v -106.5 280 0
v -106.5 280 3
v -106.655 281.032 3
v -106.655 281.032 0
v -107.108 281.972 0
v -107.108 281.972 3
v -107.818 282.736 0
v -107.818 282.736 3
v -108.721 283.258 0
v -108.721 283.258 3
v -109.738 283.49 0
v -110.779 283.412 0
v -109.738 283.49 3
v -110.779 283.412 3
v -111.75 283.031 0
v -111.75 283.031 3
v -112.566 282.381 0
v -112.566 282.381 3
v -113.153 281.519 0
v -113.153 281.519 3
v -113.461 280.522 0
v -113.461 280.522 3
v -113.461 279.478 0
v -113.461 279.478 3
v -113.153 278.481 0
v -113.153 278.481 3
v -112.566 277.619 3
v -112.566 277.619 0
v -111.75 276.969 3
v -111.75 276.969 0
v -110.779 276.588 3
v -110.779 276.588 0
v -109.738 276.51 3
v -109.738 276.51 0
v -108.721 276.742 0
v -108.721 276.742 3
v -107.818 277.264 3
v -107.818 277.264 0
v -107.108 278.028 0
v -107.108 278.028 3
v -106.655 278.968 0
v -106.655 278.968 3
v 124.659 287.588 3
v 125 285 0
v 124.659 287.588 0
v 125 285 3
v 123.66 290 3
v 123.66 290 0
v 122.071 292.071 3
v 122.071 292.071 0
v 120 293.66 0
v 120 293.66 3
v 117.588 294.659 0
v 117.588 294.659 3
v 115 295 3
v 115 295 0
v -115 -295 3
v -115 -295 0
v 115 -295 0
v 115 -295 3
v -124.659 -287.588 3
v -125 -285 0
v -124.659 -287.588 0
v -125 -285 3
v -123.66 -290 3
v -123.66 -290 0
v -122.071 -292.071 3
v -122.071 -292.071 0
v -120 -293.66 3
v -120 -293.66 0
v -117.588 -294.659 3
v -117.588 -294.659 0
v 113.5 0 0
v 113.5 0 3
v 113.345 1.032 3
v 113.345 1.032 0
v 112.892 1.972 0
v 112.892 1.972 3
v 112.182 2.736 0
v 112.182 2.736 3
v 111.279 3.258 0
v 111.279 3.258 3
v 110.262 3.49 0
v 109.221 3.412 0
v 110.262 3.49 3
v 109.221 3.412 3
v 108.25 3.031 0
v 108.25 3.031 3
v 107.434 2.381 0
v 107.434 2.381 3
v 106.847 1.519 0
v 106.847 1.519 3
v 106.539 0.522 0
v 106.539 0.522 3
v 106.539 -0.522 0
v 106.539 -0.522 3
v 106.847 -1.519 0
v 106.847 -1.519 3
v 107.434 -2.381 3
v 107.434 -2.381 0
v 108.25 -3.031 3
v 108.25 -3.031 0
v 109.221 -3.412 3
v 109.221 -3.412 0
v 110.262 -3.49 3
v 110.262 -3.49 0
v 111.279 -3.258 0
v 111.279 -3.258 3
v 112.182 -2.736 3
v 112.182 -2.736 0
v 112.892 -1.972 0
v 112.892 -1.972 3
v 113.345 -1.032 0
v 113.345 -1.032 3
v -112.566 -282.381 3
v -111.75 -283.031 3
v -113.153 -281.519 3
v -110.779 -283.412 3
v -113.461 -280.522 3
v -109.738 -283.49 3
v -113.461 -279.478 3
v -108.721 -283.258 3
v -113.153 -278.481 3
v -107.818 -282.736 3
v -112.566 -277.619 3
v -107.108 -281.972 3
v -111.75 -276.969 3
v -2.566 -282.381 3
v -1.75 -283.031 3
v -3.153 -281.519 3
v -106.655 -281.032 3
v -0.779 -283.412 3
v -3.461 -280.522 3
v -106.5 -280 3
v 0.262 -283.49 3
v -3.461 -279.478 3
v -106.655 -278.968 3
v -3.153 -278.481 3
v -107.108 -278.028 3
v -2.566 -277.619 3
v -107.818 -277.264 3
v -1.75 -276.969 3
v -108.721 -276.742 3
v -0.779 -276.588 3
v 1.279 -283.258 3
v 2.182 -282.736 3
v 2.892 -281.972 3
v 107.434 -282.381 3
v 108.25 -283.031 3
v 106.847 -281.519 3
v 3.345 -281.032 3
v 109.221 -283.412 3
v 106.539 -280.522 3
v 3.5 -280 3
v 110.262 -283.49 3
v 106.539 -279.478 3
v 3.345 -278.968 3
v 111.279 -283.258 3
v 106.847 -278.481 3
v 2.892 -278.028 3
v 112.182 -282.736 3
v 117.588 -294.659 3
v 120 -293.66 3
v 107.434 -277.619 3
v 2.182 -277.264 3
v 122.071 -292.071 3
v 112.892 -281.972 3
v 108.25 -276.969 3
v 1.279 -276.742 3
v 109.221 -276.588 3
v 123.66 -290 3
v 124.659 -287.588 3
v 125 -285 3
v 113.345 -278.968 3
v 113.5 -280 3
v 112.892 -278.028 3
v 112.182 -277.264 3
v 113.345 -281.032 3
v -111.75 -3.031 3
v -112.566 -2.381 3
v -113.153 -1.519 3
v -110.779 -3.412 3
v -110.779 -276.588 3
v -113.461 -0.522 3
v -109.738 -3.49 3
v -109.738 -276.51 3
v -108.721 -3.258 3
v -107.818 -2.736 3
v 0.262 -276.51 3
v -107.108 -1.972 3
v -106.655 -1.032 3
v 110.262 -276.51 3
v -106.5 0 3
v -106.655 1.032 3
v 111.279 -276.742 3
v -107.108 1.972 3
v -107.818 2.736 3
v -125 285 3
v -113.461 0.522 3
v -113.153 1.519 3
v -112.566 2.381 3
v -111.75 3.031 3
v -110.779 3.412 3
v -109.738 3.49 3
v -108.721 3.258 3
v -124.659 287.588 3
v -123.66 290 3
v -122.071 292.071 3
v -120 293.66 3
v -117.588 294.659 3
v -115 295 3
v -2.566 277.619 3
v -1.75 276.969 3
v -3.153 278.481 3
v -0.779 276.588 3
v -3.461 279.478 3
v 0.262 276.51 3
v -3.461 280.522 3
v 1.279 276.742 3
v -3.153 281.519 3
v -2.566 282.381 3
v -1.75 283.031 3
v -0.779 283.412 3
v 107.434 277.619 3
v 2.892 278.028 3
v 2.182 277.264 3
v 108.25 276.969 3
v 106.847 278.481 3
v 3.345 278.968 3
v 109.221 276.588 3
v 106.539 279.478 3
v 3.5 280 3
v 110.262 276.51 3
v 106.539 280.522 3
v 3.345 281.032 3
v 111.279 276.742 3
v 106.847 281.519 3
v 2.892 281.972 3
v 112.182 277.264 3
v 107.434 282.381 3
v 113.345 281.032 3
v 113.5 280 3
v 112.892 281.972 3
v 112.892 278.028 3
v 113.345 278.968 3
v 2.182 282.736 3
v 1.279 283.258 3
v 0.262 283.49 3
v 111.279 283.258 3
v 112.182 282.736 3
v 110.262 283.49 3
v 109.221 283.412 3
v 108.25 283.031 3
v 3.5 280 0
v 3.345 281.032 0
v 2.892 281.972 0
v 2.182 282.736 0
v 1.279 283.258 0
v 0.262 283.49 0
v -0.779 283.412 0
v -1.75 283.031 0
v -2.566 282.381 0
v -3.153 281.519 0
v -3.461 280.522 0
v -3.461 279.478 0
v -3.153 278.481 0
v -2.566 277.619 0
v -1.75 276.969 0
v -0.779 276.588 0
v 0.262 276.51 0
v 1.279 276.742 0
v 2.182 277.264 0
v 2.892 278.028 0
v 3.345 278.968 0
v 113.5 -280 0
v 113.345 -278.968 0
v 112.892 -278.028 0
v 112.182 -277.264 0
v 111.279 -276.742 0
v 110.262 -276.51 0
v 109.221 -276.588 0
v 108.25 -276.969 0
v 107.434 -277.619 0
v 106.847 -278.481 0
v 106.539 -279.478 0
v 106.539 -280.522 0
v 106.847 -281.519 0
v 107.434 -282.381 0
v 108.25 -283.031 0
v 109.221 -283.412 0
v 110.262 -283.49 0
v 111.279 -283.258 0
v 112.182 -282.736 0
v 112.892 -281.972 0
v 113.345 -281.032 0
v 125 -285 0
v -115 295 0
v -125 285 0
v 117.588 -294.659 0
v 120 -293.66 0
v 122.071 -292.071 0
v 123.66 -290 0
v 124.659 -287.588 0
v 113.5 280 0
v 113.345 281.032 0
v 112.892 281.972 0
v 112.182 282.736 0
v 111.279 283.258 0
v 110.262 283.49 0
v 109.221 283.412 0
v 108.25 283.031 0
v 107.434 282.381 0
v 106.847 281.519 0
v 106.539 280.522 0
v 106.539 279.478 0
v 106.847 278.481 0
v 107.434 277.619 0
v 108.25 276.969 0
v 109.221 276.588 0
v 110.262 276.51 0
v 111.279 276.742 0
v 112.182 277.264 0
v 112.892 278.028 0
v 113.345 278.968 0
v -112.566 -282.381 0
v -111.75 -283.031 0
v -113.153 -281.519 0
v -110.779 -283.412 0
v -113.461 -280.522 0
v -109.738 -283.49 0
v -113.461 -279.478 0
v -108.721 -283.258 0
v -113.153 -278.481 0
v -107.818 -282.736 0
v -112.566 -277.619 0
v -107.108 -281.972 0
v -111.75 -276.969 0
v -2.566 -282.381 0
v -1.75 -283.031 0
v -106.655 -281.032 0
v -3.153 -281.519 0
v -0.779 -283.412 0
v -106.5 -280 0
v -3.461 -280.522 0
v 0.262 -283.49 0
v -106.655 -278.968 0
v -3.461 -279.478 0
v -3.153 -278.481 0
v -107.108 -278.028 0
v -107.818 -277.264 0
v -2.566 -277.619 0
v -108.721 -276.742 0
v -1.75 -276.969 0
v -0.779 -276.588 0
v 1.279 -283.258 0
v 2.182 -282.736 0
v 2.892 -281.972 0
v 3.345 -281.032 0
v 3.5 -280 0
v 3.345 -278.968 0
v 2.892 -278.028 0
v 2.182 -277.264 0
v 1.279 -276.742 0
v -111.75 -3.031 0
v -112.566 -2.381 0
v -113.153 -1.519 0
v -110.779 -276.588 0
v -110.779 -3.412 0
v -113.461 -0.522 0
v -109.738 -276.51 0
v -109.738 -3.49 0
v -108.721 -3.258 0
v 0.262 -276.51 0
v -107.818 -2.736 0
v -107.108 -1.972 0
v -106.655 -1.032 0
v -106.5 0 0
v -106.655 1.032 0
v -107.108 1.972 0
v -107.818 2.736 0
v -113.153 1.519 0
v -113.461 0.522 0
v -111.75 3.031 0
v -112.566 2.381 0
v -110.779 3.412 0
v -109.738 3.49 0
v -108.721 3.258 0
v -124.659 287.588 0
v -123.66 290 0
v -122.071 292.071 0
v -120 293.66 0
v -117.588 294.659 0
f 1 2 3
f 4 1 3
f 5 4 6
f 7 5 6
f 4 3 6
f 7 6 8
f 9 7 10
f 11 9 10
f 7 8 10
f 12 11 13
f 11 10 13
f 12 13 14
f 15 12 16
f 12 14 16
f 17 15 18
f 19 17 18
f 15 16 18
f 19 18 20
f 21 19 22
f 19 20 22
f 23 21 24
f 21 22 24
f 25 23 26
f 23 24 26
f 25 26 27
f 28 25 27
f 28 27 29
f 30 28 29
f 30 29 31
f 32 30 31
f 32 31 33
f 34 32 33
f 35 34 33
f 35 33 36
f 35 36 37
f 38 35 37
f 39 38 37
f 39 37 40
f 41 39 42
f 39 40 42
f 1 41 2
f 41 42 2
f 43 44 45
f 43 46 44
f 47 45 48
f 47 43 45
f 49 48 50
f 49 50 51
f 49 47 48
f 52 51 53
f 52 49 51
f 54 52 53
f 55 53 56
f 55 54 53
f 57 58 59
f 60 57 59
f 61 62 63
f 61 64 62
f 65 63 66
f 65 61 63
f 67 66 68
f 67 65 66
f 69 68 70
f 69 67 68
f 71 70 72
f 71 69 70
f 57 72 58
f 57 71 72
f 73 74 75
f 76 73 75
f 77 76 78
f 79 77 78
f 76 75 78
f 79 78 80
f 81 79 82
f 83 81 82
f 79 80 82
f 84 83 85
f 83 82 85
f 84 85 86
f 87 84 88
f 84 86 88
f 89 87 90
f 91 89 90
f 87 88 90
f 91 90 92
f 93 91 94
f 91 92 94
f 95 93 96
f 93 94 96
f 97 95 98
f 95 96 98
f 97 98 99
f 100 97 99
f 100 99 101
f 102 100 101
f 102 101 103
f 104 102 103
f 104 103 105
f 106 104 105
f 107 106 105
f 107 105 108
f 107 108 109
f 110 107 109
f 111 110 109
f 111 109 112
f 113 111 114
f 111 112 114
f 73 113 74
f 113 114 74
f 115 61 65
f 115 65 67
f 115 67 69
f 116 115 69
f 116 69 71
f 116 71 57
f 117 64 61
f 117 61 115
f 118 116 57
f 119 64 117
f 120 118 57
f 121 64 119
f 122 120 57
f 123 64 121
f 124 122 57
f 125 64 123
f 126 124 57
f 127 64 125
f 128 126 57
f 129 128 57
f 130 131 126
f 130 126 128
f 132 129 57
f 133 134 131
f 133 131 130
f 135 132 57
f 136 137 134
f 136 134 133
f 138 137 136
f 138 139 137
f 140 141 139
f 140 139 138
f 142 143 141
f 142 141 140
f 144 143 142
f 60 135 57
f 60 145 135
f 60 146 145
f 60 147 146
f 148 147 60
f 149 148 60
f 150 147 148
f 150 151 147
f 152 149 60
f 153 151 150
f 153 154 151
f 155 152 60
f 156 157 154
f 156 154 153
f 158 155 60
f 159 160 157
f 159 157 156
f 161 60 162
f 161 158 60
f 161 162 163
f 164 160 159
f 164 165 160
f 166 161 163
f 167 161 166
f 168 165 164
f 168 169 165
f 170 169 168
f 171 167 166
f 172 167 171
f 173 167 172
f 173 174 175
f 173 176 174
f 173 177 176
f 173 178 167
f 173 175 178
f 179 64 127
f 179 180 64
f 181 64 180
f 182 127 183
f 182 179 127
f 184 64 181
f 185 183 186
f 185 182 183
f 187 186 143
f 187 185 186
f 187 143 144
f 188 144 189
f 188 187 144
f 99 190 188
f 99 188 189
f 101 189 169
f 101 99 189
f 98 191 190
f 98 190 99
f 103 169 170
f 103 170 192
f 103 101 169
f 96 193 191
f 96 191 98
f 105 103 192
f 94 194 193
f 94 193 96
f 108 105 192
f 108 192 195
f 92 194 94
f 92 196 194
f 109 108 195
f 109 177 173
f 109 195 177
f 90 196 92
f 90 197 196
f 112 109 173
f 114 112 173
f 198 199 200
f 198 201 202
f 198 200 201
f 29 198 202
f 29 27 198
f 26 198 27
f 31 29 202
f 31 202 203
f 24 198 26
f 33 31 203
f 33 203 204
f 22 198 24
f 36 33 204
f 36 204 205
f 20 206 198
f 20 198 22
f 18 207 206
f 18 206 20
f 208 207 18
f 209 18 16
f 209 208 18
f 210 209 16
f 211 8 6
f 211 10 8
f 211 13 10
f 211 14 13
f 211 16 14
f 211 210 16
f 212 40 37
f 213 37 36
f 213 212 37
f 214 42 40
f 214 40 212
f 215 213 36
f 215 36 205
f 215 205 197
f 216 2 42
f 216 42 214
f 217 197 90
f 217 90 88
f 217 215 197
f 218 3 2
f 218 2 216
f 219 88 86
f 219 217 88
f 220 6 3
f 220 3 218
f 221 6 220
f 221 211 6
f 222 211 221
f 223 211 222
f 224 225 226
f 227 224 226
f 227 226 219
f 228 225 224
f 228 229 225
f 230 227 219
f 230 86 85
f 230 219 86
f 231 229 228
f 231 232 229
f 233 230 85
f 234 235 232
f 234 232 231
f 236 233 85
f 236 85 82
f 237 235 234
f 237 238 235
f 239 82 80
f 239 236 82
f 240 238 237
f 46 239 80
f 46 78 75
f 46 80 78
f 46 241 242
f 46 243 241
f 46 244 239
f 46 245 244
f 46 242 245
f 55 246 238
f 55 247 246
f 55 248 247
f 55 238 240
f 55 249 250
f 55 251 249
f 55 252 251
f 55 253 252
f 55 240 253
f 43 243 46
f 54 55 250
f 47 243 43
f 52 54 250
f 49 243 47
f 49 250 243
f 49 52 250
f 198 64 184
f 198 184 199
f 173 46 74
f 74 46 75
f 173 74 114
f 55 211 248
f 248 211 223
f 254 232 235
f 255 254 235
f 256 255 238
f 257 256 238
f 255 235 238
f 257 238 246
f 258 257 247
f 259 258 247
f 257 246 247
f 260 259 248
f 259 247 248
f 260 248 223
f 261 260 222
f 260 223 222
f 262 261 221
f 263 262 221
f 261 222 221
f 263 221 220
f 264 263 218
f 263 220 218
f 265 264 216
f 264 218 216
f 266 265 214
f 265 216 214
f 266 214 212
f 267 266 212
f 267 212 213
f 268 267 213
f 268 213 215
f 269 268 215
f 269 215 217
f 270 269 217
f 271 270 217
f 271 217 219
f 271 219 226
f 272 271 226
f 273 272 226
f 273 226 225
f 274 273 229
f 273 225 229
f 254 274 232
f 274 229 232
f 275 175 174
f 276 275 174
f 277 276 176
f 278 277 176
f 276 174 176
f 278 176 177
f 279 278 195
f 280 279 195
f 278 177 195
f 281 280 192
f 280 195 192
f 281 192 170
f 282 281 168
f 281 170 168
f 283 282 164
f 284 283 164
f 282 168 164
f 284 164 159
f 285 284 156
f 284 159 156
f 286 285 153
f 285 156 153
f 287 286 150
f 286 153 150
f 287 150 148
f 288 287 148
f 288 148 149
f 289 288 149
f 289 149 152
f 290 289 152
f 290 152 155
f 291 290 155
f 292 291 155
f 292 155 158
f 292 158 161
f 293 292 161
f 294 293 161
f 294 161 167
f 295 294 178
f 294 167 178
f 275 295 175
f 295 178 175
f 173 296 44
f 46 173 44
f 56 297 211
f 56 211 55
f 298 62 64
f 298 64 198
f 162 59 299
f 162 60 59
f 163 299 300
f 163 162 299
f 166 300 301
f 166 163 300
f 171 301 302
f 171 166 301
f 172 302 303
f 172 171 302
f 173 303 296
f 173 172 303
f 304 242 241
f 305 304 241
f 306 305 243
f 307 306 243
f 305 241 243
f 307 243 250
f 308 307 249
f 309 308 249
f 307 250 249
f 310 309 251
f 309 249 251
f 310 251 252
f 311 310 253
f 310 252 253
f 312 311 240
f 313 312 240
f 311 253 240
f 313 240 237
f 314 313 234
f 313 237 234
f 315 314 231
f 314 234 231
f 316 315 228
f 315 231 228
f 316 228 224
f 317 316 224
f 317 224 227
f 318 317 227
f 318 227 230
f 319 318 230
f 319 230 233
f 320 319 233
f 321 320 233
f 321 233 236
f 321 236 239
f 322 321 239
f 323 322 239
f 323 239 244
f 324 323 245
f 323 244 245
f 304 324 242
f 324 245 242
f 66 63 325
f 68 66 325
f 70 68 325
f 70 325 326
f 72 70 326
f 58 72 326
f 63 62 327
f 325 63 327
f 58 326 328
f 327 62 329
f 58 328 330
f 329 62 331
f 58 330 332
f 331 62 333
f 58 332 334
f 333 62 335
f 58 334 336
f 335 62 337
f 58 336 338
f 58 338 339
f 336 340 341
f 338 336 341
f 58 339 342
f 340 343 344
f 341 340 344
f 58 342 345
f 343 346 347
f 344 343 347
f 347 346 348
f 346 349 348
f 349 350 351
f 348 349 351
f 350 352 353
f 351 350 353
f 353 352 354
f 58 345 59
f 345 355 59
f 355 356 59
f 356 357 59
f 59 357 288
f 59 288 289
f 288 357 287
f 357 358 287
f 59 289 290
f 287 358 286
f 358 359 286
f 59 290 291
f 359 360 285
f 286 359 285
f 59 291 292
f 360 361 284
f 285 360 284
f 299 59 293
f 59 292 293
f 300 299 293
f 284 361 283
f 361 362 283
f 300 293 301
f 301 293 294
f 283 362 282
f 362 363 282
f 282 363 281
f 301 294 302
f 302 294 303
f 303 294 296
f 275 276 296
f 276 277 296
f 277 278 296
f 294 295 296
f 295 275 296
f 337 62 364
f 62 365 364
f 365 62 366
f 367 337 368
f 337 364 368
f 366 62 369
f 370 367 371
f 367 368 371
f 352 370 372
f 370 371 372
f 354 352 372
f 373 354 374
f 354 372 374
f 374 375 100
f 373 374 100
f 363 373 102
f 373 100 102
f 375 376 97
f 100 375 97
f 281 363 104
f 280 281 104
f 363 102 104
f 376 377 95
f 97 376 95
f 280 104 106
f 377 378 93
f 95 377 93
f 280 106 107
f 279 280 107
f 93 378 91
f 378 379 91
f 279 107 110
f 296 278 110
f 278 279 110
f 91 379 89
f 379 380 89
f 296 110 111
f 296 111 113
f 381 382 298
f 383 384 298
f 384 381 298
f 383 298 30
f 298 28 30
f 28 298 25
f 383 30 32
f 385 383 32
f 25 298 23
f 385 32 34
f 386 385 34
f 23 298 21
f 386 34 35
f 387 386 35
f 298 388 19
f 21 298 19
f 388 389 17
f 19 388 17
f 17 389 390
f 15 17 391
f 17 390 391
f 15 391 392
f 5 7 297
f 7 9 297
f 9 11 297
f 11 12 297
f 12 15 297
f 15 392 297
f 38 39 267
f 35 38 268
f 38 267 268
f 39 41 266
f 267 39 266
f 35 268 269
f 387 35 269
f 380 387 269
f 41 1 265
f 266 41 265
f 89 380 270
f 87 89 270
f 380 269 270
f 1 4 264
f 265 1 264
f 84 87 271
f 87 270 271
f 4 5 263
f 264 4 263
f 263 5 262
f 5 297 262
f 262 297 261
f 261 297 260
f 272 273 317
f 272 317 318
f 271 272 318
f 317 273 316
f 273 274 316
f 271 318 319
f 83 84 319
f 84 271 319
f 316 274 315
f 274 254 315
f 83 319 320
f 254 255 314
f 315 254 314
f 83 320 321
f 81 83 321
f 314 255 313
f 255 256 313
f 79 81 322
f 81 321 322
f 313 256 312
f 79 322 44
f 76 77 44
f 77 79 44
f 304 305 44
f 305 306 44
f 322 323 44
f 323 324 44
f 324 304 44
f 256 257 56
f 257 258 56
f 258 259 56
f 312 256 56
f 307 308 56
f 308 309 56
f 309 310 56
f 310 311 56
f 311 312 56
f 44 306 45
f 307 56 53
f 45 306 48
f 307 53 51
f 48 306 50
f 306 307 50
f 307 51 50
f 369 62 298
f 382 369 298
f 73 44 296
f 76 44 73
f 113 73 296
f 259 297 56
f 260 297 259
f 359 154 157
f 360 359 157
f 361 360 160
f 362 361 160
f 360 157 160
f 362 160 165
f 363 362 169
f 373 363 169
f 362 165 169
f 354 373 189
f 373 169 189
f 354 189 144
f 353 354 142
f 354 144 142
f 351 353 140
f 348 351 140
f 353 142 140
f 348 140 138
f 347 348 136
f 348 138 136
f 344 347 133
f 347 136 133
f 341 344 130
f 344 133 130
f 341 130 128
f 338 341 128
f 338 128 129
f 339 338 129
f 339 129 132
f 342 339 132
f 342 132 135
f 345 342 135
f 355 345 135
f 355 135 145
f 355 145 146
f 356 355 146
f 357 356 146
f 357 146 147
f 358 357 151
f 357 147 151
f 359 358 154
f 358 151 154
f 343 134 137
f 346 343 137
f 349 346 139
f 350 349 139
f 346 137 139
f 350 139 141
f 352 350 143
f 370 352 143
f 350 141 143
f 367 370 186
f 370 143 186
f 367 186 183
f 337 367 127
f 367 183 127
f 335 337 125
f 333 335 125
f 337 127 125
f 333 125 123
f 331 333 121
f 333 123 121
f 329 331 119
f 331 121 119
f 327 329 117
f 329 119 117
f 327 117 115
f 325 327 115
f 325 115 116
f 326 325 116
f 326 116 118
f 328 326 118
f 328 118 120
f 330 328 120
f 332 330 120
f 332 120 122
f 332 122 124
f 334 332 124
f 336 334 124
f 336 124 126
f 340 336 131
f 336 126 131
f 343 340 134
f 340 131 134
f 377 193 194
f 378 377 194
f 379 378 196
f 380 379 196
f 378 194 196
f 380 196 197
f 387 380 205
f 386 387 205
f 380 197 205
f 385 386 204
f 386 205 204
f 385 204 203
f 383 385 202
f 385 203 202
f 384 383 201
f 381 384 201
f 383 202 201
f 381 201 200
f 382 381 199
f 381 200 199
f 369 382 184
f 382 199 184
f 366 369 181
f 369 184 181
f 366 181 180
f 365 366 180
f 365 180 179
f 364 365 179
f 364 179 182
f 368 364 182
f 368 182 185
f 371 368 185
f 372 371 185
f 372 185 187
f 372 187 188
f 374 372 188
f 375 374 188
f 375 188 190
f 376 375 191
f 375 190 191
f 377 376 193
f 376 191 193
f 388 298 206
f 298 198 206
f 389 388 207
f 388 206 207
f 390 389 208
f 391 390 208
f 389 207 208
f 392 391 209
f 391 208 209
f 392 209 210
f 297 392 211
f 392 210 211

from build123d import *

# Parameters (mm, degrees)
SKETCH_1_W          = 250
SKETCH_1_H          = 590
EXTRUDE_1_DEPTH     = 3
FILLET_1_R          = 10
SKETCH_3_R          = 3.5
CUT_EXTRUDE_1_DEPTH = 3


with BuildPart() as part:
    # 草图1 → 凸台-拉伸1 (new body)
    with BuildSketch(Plane.XY):
        Rectangle(SKETCH_1_W, SKETCH_1_H)
    extrude(amount=EXTRUDE_1_DEPTH)

    # 圆角1
    fillet_1_edges = [part.edges().sort_by_distance(p)[0] for p in [
        (125, -295, 1.5),
        (-125, -295, 1.5),
        (-125, 295, 1.5),
        (125, 295, 1.5),
    ]]
    fillet(fillet_1_edges, radius=FILLET_1_R)

    # 草图3 → 切除-拉伸1 (cut)
    with BuildSketch(Plane.XY.offset(3)):
        with Locations((-110, 280)):
            Circle(SKETCH_3_R)
        with Locations((-110, -280)):
            Circle(SKETCH_3_R)
        with Locations((110, 280)):
            Circle(SKETCH_3_R)
        with Locations((110, -280)):
            Circle(SKETCH_3_R)
        with Locations((-110, 0)):
            Circle(SKETCH_3_R)
        with Locations((110, 0)):
            Circle(SKETCH_3_R)
        with Locations((0, 280)):
            Circle(SKETCH_3_R)
        with Locations((0, -280)):
            Circle(SKETCH_3_R)
    extrude(amount=-CUT_EXTRUDE_1_DEPTH, mode=Mode.SUBTRACT)


solid = part.part
